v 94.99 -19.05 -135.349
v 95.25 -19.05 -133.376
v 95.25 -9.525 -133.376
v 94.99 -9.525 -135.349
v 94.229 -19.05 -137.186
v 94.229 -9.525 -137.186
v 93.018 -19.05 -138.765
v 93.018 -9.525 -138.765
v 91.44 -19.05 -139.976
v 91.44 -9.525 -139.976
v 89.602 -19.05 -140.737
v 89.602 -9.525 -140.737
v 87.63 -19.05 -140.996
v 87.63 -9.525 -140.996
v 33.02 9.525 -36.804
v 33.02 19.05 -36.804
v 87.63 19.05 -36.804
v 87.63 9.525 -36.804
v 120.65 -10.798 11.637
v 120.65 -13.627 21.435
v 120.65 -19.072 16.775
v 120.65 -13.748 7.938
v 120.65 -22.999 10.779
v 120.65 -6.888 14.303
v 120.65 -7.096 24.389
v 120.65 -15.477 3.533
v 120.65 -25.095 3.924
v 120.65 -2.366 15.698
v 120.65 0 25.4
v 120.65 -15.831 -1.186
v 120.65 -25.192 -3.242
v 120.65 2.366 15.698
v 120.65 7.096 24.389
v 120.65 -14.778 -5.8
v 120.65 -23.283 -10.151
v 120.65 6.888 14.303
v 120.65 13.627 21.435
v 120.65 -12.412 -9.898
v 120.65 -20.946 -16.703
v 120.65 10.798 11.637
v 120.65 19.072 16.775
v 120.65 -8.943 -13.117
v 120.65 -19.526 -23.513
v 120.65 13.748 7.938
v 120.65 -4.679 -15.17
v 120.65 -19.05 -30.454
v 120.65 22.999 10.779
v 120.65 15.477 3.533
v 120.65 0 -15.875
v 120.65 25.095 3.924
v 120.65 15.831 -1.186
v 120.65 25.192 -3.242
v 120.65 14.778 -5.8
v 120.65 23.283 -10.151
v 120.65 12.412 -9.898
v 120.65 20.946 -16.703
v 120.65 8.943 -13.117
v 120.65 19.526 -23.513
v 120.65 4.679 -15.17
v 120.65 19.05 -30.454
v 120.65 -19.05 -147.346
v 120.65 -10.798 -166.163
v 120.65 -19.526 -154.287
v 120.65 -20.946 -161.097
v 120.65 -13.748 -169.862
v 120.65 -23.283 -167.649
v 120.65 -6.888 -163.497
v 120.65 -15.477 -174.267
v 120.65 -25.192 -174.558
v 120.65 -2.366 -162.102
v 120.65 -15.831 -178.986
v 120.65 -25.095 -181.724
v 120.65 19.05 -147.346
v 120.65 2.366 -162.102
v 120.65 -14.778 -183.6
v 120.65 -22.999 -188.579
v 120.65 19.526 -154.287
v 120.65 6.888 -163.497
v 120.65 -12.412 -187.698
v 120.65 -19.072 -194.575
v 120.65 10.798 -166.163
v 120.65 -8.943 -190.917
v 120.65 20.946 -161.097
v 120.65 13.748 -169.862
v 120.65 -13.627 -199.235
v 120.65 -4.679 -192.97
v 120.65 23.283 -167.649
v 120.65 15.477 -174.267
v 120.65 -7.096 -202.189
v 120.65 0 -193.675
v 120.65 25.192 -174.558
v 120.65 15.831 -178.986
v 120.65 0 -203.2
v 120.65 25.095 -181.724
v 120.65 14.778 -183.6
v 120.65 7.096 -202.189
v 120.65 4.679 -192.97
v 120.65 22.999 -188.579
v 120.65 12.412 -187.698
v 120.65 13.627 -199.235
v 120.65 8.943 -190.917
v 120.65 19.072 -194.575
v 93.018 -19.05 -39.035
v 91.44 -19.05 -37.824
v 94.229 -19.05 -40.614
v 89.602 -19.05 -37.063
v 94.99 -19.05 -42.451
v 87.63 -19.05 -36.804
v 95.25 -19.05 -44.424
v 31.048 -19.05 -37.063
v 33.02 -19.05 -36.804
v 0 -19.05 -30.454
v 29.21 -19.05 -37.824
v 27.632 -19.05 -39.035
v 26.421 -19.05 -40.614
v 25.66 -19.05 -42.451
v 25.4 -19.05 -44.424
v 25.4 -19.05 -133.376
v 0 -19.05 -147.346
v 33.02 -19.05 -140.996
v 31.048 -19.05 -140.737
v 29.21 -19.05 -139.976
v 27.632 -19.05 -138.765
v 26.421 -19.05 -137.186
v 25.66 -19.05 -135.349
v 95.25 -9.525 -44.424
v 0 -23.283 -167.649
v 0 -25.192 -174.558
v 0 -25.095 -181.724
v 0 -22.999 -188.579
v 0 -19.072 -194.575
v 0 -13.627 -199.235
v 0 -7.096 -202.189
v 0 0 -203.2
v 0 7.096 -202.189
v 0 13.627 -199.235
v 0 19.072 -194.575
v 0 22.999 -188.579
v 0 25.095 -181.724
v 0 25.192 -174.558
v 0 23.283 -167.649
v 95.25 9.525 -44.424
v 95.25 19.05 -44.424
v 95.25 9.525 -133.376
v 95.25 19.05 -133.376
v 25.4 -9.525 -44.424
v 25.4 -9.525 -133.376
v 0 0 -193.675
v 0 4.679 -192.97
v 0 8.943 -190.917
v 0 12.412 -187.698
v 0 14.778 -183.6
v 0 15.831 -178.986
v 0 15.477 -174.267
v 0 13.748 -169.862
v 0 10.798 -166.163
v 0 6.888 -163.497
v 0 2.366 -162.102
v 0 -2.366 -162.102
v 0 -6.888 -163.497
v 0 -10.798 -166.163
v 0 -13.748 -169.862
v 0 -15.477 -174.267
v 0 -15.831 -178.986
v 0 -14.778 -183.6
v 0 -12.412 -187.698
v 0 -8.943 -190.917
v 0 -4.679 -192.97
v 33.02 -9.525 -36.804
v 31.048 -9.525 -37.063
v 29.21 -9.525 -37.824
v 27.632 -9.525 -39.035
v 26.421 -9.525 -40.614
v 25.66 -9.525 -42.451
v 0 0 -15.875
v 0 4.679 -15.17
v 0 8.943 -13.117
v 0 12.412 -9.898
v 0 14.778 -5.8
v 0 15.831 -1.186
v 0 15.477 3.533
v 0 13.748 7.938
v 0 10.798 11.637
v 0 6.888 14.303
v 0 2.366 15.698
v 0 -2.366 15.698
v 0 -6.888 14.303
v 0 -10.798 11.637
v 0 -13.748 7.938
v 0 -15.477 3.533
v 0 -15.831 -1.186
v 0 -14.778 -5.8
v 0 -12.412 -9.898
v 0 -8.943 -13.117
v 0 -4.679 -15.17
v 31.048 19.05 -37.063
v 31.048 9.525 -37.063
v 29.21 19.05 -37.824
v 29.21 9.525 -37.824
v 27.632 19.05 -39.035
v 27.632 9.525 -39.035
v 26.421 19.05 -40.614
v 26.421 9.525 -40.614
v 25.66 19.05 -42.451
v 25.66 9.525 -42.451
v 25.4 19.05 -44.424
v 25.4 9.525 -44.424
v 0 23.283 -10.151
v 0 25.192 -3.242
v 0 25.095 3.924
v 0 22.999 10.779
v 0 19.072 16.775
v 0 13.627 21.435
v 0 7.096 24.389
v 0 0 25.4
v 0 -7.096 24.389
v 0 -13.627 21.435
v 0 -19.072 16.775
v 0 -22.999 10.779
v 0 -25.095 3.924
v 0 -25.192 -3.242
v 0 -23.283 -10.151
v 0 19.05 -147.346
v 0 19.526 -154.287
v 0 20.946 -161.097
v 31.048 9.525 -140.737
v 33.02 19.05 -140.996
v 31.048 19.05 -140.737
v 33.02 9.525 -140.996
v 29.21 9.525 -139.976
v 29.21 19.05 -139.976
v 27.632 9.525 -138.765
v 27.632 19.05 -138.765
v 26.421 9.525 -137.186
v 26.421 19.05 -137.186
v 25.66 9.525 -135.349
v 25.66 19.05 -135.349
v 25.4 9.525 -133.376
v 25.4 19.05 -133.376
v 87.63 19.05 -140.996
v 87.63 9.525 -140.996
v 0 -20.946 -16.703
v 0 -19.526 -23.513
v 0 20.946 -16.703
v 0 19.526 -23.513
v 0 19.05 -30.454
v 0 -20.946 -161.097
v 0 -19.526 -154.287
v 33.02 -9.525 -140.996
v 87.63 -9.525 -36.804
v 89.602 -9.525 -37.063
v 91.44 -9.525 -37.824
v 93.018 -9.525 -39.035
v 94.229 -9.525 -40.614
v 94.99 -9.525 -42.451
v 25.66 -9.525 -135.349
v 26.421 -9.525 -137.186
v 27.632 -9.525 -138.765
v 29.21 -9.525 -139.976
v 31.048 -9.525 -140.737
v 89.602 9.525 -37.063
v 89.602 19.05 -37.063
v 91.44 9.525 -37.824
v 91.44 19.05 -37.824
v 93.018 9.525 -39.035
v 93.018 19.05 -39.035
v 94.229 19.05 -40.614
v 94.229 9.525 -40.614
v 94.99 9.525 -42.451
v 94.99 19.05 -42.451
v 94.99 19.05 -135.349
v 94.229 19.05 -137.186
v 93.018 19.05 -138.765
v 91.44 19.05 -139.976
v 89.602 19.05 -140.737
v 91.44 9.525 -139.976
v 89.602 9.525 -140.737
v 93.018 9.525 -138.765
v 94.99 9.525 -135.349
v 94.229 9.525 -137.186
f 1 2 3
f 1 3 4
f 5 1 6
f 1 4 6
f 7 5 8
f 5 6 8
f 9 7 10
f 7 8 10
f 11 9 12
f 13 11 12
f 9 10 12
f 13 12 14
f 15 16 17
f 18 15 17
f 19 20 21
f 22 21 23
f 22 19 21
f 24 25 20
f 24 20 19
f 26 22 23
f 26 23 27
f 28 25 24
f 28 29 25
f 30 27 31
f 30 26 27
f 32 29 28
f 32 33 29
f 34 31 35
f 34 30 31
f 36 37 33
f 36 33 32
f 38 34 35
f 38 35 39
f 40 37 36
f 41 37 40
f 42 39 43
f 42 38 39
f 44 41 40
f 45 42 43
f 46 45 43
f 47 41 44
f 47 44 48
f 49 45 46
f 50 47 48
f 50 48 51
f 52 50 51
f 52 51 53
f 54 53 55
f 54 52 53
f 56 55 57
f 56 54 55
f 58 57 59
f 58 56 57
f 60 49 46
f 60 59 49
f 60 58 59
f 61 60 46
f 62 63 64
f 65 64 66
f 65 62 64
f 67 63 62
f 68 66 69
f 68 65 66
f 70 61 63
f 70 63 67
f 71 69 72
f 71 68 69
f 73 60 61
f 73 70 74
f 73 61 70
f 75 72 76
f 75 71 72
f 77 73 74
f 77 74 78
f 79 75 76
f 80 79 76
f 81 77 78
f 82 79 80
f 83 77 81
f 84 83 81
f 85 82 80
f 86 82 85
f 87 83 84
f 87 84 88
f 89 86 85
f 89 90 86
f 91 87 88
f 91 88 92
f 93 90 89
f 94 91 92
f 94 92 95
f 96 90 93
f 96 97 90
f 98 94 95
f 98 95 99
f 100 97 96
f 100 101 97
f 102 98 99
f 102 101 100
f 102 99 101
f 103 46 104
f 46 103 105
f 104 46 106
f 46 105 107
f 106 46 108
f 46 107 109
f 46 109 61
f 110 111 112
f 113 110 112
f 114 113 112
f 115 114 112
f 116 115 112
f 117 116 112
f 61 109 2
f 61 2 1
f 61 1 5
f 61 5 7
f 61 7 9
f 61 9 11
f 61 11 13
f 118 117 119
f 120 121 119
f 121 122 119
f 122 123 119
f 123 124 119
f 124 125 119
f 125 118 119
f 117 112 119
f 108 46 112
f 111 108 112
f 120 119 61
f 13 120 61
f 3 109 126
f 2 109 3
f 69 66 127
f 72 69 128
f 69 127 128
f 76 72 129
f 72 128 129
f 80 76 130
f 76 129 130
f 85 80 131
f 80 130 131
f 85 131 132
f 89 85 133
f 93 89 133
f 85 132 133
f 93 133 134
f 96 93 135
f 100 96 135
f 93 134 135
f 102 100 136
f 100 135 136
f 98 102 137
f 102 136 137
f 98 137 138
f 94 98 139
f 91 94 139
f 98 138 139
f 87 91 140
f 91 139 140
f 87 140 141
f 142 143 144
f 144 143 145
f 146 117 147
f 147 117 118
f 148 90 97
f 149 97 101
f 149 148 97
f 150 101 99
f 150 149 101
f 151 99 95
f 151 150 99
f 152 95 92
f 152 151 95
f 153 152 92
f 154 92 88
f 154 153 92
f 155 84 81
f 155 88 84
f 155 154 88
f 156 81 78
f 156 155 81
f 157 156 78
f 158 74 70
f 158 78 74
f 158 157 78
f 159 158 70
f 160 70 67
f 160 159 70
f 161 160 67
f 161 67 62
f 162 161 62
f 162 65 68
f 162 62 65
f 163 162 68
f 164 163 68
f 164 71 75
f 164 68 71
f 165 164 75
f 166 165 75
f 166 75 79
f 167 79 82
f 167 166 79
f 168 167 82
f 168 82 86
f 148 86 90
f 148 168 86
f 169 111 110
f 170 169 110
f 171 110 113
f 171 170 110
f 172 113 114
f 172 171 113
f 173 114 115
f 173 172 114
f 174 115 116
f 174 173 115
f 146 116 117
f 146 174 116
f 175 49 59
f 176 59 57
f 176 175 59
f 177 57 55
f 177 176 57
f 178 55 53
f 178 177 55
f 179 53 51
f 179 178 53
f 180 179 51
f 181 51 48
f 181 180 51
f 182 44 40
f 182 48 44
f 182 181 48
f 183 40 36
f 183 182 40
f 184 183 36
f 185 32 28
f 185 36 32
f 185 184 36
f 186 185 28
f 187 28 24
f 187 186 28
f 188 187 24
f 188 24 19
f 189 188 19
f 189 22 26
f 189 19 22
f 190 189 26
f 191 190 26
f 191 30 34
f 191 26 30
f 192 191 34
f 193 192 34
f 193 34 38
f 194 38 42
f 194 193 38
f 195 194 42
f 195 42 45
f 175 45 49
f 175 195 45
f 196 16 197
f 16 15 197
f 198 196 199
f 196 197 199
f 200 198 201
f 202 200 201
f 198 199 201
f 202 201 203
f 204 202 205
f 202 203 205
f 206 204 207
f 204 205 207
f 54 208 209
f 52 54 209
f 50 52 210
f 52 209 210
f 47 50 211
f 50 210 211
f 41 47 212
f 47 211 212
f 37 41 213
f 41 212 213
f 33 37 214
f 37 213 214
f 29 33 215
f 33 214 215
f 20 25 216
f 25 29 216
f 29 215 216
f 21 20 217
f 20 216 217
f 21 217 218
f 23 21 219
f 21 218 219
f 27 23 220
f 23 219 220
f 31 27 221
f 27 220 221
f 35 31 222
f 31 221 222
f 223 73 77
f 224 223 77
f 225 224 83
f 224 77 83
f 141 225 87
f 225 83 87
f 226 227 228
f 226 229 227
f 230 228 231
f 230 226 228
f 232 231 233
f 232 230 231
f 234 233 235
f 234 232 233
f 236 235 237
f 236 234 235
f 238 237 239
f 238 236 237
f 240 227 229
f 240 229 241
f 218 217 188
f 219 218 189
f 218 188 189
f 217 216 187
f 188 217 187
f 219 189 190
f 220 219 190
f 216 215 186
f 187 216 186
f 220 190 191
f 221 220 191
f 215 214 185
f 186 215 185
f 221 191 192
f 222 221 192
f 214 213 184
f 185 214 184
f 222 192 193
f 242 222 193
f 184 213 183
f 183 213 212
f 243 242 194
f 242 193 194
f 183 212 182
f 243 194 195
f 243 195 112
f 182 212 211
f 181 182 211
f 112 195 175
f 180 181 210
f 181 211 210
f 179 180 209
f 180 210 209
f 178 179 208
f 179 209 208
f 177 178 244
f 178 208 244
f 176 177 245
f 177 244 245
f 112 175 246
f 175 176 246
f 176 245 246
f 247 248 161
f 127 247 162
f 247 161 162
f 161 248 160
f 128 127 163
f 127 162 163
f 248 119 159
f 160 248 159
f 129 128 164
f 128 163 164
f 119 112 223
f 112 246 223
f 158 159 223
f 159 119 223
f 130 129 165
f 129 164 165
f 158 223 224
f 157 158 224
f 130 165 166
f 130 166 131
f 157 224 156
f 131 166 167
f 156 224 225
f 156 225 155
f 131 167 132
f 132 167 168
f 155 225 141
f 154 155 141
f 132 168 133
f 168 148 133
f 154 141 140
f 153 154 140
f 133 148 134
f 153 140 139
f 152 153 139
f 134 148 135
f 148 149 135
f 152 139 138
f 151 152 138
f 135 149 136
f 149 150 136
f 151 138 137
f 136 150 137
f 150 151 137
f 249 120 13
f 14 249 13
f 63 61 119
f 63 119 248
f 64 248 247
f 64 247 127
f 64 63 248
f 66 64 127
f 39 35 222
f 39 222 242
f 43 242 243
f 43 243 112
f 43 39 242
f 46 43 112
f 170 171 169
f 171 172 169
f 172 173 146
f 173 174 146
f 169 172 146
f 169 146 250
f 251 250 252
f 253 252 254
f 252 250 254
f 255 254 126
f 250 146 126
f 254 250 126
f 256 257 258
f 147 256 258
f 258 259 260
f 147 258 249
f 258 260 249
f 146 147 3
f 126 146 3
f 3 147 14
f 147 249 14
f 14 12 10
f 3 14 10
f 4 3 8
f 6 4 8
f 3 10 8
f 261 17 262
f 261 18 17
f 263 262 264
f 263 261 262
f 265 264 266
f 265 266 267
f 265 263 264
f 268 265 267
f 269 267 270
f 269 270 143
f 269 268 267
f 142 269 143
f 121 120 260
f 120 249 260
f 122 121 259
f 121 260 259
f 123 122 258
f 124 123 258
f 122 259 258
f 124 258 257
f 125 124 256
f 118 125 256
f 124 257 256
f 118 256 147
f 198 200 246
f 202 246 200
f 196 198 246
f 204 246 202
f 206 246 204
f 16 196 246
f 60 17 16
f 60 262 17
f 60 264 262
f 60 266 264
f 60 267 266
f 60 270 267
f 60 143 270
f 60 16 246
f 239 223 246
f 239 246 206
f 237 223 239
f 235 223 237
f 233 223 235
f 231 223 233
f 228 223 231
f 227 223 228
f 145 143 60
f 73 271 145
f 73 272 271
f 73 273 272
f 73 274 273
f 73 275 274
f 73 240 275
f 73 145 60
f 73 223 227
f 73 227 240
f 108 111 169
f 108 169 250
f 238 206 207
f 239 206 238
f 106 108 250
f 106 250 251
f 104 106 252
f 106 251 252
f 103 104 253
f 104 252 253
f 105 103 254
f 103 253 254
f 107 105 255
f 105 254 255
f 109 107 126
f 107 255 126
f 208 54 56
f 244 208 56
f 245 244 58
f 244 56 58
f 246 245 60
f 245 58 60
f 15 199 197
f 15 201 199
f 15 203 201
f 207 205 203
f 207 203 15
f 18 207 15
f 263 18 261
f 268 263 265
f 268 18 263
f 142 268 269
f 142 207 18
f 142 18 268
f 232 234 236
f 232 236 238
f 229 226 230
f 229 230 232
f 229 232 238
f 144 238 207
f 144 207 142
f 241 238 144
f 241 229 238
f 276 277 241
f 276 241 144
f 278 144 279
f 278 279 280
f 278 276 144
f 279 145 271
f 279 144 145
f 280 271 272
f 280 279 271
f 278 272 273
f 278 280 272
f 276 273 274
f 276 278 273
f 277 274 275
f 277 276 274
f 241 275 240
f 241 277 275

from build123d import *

# Parameters (mm, degrees)
SKETCH1_R               = 15.875
BOSS_EXTRUDE1_DEPTH     = 127
FILLET1_R               = 50.8
SKETCH2_W               = 25.4
SKETCH2_H               = 241.689615924
CUT_EXTRUDE1_DEPTH      = 7.35
CUT_EXTRUDE1_DEPTH_BACK = 45.45
SKETCH3_W               = 69.85
SKETCH3_H               = 104.192939654
CUT_EXTRUDE2_DEPTH      = 9.525
FILLET2_R               = 7.62
FILLET2_OF_MIRROR1_R    = 7.62


with BuildPart() as part:
    # Sketch1 → Boss-Extrude1 (new body)
    with BuildSketch(Plane(origin=(0, 0, 0), x_dir=(0, 0, -1), z_dir=(1, 0, 0))):
        with BuildLine():
            ThreePointArc((16.800520825, 19.05), (-25.4, 0), (16.800520825, -19.05))
            Line((16.800520825, -19.05), (160.999479175, -19.05))
            ThreePointArc((160.999479175, -19.05), (203.2, 0), (160.999479175, 19.05))
            Line((160.999479175, 19.05), (16.800520825, 19.05))
        make_face()
        Circle(SKETCH1_R, mode=Mode.SUBTRACT)
        with Locations((177.8, 0)):
            Circle(SKETCH1_R, mode=Mode.SUBTRACT)
    extrude(amount=BOSS_EXTRUDE1_DEPTH)

    # Fillet1
    fillet1_edges = [part.edges().sort_by_distance(p)[0] for p in [
        (63.5, -19.05, -16.800520825),
        (63.5, 19.05, -16.800520825),
        (63.5, 19.05, -160.999479175),
        (63.5, -19.05, -160.999479175),
    ]]
    fillet(fillet1_edges, radius=FILLET1_R)

    # Sketch2 → Cut-Extrude1 (cut, two sides)
    with BuildSketch(Plane(origin=(0, 19.05, 0), x_dir=(1, 0, 0), z_dir=(0, 1, 0))) as cut_extrude1_sk:
        with Locations((133.35, 89.453065483)):
            Rectangle(SKETCH2_W, SKETCH2_H)
    extrude(amount=CUT_EXTRUDE1_DEPTH, mode=Mode.SUBTRACT)
    extrude(cut_extrude1_sk.sketch, amount=-CUT_EXTRUDE1_DEPTH_BACK, mode=Mode.SUBTRACT)

    # Sketch3 → Cut-Extrude2 (cut)
    with BuildSketch(Plane(origin=(0, 19.05, 0), x_dir=(1, 0, 0), z_dir=(0, 1, 0))):
        with Locations((60.325, 88.9)):
            Rectangle(SKETCH3_W, SKETCH3_H)
    cut_extrude2 = extrude(amount=-CUT_EXTRUDE2_DEPTH, mode=Mode.SUBTRACT)

    # Fillet2
    fillet2_edges = [part.edges().sort_by_distance(p)[0] for p in [
        (25.4, 14.2875, -36.803530173),
        (25.4, 14.2875, -140.996469827),
        (95.25, 14.2875, -140.996469827),
        (95.25, 14.2875, -36.803530173),
    ]]
    fillet(fillet2_edges, radius=FILLET2_R)

    # Mirror1: Cut-Extrude2 across plane
    add(cut_extrude2.mirror(Plane.ZX), mode=Mode.SUBTRACT)

    # Fillet2 of Mirror1
    fillet2_of_mirror1_edges = [part.edges().sort_by_distance(p)[0] for p in [
        (25.4, -14.2875, -36.803530173),
        (25.4, -14.2875, -140.996469827),
        (95.25, -14.2875, -140.996469827),
        (95.25, -14.2875, -36.803530173),
    ]]
    fillet(fillet2_of_mirror1_edges, radius=FILLET2_OF_MIRROR1_R)


solid = part.part
